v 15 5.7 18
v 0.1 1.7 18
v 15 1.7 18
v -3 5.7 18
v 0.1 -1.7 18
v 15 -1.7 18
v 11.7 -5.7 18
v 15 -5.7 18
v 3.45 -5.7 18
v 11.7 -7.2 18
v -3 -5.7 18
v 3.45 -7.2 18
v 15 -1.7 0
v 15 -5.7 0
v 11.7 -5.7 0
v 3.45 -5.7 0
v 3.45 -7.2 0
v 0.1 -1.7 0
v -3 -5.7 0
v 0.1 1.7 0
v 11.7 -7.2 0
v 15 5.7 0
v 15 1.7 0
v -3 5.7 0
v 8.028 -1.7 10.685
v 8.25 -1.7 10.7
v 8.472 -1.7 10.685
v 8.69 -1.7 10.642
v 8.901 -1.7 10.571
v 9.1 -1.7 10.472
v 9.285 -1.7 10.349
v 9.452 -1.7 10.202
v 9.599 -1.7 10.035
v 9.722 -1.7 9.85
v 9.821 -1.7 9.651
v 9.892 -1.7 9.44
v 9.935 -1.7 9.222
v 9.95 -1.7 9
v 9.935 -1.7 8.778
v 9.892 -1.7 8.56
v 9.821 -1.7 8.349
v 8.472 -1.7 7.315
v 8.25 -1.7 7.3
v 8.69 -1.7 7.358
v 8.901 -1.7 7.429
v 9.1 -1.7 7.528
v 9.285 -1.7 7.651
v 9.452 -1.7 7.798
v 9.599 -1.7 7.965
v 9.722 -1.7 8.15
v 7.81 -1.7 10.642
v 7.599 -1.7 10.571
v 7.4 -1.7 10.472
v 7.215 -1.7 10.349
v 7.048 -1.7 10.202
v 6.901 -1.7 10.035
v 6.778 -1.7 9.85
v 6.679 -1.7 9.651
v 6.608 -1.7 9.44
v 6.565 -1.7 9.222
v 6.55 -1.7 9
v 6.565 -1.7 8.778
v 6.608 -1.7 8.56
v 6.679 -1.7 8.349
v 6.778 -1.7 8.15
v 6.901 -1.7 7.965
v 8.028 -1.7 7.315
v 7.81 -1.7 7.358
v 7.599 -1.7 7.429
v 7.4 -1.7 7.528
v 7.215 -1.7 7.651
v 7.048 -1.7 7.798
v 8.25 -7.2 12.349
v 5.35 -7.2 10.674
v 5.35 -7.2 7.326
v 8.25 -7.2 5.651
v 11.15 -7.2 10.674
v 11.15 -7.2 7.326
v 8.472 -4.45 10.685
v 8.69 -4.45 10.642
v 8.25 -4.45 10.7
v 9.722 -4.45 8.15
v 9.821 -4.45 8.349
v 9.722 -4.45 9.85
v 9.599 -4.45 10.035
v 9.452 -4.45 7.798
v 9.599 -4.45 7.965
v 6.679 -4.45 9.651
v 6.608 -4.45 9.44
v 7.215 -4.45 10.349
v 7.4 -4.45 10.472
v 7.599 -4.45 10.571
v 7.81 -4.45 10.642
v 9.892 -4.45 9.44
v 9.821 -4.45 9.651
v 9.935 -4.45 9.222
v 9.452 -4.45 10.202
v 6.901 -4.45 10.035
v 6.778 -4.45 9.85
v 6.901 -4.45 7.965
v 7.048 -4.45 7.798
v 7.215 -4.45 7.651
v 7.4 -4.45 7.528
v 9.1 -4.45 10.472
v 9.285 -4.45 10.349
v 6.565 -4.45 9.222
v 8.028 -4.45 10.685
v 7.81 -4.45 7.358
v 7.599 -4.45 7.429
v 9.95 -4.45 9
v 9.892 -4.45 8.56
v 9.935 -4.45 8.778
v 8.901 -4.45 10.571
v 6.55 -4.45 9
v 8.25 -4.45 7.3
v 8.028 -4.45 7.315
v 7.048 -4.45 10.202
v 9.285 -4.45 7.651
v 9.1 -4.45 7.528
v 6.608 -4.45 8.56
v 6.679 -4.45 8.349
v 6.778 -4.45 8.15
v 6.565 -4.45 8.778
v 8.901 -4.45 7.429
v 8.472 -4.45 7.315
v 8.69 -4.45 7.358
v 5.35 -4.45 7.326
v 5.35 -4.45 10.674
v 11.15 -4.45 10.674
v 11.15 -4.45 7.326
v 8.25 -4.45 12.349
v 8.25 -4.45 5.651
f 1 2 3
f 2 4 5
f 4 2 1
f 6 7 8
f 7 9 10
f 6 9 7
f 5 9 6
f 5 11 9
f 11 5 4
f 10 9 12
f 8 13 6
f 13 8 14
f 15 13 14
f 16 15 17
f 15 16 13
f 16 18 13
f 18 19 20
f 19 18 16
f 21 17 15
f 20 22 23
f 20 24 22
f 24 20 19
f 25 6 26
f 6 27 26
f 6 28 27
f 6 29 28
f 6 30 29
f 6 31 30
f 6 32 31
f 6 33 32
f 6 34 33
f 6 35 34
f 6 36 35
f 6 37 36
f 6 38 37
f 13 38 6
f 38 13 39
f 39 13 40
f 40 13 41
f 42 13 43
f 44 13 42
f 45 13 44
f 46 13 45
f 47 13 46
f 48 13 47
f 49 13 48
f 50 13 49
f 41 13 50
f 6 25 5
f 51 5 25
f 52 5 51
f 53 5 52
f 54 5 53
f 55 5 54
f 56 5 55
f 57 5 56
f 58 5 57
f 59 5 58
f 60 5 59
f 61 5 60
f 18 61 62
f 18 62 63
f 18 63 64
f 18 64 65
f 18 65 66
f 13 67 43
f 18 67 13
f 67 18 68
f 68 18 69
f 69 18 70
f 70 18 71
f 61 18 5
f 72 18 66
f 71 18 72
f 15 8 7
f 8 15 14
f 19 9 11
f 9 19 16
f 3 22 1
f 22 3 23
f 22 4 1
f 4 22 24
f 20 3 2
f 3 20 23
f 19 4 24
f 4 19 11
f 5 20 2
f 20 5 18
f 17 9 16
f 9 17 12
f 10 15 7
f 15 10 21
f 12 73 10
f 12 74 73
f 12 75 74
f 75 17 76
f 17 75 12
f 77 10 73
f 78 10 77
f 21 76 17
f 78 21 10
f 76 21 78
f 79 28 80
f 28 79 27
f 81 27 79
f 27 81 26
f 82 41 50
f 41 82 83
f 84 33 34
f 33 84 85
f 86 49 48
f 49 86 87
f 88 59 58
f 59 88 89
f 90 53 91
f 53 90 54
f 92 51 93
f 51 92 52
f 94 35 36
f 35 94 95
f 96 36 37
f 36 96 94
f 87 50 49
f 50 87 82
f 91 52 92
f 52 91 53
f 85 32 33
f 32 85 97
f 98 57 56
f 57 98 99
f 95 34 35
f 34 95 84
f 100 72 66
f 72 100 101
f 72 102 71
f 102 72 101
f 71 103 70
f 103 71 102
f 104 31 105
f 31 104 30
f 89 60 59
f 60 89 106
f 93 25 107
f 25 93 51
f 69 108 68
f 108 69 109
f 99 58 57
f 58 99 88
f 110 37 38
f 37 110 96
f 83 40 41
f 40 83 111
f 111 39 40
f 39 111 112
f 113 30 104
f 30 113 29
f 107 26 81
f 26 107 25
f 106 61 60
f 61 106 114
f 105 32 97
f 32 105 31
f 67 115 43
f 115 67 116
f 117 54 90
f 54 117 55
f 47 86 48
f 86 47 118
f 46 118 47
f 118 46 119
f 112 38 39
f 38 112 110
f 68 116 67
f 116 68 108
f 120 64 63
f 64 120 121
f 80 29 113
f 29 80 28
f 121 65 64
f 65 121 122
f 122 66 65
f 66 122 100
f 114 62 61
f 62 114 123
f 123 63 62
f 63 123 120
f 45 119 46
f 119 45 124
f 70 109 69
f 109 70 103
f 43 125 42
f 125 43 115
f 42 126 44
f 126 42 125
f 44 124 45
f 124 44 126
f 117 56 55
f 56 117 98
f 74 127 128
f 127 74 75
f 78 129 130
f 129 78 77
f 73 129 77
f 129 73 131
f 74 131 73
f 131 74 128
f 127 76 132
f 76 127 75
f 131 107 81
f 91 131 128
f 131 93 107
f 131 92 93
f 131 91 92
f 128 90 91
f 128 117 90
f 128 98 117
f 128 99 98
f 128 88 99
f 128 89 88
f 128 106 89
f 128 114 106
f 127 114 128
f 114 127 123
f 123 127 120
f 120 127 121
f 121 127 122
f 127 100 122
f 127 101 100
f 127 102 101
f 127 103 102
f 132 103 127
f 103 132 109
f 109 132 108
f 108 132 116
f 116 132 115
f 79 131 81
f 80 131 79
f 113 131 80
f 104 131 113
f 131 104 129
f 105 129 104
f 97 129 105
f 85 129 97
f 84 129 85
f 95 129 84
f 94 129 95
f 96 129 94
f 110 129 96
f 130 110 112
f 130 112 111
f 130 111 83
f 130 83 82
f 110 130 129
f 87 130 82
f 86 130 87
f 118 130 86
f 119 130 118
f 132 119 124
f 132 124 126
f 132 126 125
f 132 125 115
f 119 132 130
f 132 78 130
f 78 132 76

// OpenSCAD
// file: servo_mount.scad
// Provisional side-rim mount. Local X runs inward from the hinge plane,
// local Y runs inward from the selected side wall, and Z points up.
// Printable output is laid on its broad X/Z face; no measured side-rim fit is claimed.
include <parameters.scad>

$fn = 48;
eps = 0.04;
side_outer = side_clamp_gap / 2 + side_clamp_wall;
side_body_center_x = side_servo_shaft_x - servo_shaft_offset_x;
side_body_center_z = side_servo_shaft_z - side_rim_top_z;
side_aperture_x = servo_body_x + 2 * body_clearance_per_side;
side_aperture_z = servo_body_y + 2 * body_clearance_per_side;
side_plate_left = min(side_clamp_start_x,
                      side_body_center_x - side_aperture_x / 2 - side_servo_plate_margin);
side_plate_right = side_body_center_x + side_aperture_x / 2 + side_servo_plate_margin;
side_plate_bottom = side_body_center_z - side_aperture_z / 2 - side_servo_plate_margin;
side_plate_top = max(side_clamp_bridge,
                     side_body_center_z + side_aperture_z / 2 + side_servo_plate_margin);
side_plate_inner_y = -side_outer - side_servo_plate_outset;
side_plate_outer_y = side_plate_inner_y - side_servo_plate_thickness;

assert(mount_side == "left" || mount_side == "right");
assert(side_clamp_gap >= side_rim_wall_thickness);
assert(side_clamp_length >= 16 && side_rim_grip_depth >= 10);
assert(side_plate_left < side_clamp_start_x + side_clamp_length);
assert(side_plate_bottom < -side_rim_grip_depth);
assert(servo_ear_hole_pitch / 2 - servo_ear_pilot_d / 2 > side_aperture_x / 2);

module side_rim_clamp(length = side_clamp_length, screws = 2) {
    difference() {
        union() {
            // U section over a PROVISIONAL upright side-rim wall.
            translate([0, -side_outer, -side_rim_grip_depth])
                cube([length, side_clamp_wall, side_rim_grip_depth + 0.15]);
            translate([0, side_clamp_gap / 2, -side_rim_grip_depth])
                cube([length, side_clamp_wall, side_rim_grip_depth + 0.15]);
            translate([0, -side_outer, -0.1])
                cube([length, 2 * side_outer, side_clamp_bridge + 0.1]);
            // Extra outside material keeps the nut pocket within the jaw.
            translate([0, -side_outer - 1.5, -side_rim_grip_depth * 0.78])
                cube([length, 1.5, side_rim_grip_depth * 0.55]);
        }
        for (i = [1 : screws]) {
            sx = length * i / (screws + 1);
            sz = -side_rim_grip_depth * 0.55;
            translate([sx, -side_outer - 1.6, sz])
                rotate([-90, 0, 0])
                    cylinder(d = side_clamp_screw_d, h = side_clamp_wall + 1.8);
            translate([sx, -side_outer - 1.55, sz])
                rotate([-90, 0, 0])
                    cylinder(d = side_clamp_nut_af / cos(30),
                             h = side_clamp_nut_depth, $fn = 6);
        }
    }
}

module side_servo_mount() {
    difference() {
        union() {
            translate([side_clamp_start_x, 0, 0]) side_rim_clamp();
            // Servo ear plate and aperture face the outside of the bin.
            translate([side_plate_left, side_plate_outer_y, side_plate_bottom])
                cube([side_plate_right - side_plate_left,
                      side_servo_plate_thickness,
                      side_plate_top - side_plate_bottom]);
            // Continuous web ties the whole clamp length to the plate so the
            // exterior jaw is supported when the plate face is on the bed.
            translate([side_clamp_start_x, side_plate_inner_y - 0.1,
                       -side_rim_grip_depth])
                cube([side_clamp_length,
                      -side_outer - side_plate_inner_y + 0.2,
                      side_rim_grip_depth + side_clamp_bridge]);
        }
        translate([side_body_center_x - side_aperture_x / 2,
                   side_plate_outer_y - eps,
                   side_body_center_z - side_aperture_z / 2])
            cube([side_aperture_x,
                  side_servo_plate_thickness + 2 * eps,
                  side_aperture_z]);
        for (sx = [-1, 1])
            translate([side_body_center_x + sx * servo_ear_hole_pitch / 2,
                       side_plate_outer_y - eps, side_body_center_z])
                rotate([-90, 0, 0])
                    cylinder(d = servo_ear_pilot_d,
                             h = side_servo_plate_thickness + 2 * eps);
    }
}

// Reorient the broad X/Z profile onto the print bed.
translate([0, 0, -side_plate_outer_y]) rotate([90, 0, 0]) side_servo_mount();
// main file
// Print this side-rim clamp section first, then check the lid at 0/45/90 degrees.
include <parameters.scad>
use <servo_mount.scad>

coupon_length = 18;
// Stand the constant U cross-section on the bed; no long jaw overhang.
rotate([0, -90, 0]) side_rim_clamp(length = coupon_length, screws = 1);
